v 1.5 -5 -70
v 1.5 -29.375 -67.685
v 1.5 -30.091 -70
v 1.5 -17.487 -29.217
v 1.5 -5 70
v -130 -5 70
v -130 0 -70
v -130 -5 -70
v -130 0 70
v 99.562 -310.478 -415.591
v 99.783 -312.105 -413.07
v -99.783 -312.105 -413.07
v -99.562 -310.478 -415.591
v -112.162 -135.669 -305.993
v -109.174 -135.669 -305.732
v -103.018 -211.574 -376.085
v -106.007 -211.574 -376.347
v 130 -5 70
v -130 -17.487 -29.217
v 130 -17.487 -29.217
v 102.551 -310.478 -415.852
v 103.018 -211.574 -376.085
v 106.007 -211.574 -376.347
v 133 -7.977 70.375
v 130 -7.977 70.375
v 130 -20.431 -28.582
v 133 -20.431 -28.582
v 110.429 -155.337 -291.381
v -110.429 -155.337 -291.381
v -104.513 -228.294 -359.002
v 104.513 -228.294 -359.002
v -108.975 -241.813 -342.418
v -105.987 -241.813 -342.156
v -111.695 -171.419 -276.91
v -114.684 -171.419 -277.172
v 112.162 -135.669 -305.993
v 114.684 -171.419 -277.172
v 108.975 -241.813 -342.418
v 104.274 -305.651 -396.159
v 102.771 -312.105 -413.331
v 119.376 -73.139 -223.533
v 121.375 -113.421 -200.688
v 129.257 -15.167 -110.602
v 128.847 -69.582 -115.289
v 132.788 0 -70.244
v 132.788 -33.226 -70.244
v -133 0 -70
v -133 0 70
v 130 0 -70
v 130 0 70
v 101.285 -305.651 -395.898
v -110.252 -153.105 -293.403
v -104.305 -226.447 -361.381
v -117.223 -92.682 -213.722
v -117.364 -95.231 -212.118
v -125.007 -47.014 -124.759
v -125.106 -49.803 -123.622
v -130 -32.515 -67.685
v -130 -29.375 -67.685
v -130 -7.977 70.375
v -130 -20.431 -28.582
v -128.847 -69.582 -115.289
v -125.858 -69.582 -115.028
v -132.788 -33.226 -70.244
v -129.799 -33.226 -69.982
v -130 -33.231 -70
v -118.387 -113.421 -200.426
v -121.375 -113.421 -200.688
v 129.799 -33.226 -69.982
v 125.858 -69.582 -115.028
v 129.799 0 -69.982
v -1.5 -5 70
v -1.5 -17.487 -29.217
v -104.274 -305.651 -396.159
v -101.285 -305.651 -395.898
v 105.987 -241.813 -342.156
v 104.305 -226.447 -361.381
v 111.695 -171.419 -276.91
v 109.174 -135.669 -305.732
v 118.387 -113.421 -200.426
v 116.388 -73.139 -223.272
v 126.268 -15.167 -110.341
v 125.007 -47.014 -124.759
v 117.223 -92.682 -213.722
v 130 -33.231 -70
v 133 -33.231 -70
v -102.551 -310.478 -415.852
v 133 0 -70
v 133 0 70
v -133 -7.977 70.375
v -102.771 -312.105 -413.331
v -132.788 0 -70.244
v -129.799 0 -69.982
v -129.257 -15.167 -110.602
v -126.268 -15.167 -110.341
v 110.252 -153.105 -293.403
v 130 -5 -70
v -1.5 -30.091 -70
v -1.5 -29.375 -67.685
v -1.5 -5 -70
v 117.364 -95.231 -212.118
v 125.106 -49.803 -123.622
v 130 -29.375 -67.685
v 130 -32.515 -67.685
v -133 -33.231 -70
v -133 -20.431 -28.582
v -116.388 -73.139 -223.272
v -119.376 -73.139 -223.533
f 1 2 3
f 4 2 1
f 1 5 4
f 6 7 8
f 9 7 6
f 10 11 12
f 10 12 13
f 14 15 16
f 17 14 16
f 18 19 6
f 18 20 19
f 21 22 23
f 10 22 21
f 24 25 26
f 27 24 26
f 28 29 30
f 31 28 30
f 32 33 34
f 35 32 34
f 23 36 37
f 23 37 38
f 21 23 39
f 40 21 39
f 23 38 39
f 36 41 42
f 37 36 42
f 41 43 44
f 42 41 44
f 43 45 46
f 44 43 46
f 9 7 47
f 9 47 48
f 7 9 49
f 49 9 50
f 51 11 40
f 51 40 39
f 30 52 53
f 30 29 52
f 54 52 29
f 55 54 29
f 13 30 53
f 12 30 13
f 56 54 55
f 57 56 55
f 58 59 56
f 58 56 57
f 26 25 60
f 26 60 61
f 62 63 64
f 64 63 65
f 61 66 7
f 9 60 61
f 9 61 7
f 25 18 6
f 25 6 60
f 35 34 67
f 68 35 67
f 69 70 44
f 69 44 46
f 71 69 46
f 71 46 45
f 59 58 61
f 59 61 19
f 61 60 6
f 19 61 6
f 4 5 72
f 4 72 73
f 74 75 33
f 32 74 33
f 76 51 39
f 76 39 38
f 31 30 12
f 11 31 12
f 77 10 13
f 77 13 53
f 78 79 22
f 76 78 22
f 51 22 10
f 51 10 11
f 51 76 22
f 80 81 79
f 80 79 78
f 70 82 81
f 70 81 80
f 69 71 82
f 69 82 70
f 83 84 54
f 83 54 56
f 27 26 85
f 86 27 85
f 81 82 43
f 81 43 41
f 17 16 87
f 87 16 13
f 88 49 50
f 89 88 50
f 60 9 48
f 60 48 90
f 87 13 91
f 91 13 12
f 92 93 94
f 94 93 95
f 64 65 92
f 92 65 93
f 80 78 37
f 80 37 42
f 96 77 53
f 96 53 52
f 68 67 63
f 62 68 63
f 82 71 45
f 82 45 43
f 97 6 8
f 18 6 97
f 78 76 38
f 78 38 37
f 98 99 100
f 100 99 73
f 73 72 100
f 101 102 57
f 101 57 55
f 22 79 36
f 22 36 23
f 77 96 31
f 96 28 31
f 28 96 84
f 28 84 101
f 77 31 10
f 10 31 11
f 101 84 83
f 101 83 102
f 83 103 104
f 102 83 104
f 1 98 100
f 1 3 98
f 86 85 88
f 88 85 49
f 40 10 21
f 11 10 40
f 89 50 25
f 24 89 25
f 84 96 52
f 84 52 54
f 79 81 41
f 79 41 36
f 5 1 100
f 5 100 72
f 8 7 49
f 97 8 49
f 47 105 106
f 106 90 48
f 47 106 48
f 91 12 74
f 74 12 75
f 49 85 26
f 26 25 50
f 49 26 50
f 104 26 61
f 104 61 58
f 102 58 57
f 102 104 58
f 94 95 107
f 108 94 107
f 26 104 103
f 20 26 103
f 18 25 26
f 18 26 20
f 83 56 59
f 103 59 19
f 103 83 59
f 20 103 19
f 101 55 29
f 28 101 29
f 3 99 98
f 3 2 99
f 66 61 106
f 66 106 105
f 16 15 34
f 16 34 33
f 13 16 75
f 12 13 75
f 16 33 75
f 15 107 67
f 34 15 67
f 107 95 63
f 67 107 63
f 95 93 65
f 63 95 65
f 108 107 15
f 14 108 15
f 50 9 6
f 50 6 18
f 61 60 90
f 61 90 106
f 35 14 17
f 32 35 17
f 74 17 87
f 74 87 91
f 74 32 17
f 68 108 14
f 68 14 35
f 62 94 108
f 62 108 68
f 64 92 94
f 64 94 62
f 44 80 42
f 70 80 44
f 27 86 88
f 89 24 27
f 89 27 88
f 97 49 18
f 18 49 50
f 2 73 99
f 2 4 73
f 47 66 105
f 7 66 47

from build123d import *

# Parameters (mm, degrees)
F0_W      = 260
F0_H      = 140
F1_DEPTH  = 5
F3_DEPTH  = 130
F7_W      = 657.2483032942
F7_H      = 632.9057961702
F8_DEPTH  = 174
F12_DEPTH = 3
F14_DEPTH = 3
F16_DEPTH = 1.5


with BuildPart() as f1:
    # F0 (on Front) → F1 (new body)
    with BuildSketch(Plane.XZ):
        Rectangle(F0_W, F0_H)
    extrude(amount=F1_DEPTH)


with BuildPart() as f3:
    # F2 (on Right) → F3 (new body, symmetric)
    with BuildSketch(Plane.YZ):
        Polygon((-17.4873212862, -29.2172707098), (-5, 70), (-7.9765181213, 70.3746196386), (-20.4310644359, -28.5822394788), (-49.8025794157, -123.622248239), (-95.2313994122, -212.1180756609), (-155.3371927178, -291.3808208093), (-228.2936752181, -359.0021252816), (-312.1046553088, -413.0696322199), (-310.4783616328, -415.5905782486), (-226.4468273432, -361.3807890501), (-153.1053519834, -293.4026455624), (-92.6823791695, -213.7216292766), (-47.013830355, -124.7588075522), align=None)
    extrude(amount=F3_DEPTH, both=True)


with BuildPart() as f8:
    # F7 (on face) → F8 (new body)
    with BuildSketch(Plane(origin=(134.8891541046, 0, -11.8012718167), x_dir=(0, -1, 0), z_dir=(-0.9961946981, 0, 0.0871557427))):
        with Locations((150.0718072057, -147.6648971438)):
            Rectangle(F7_W, F7_H)
    extrude(amount=-F8_DEPTH)


with BuildPart() as f9_1:
    # F9: instance of F8
    add(f8.part.mirror(Plane.YZ))


with BuildPart() as f3_1:
    add(f3.part)

    # F10: cut F9_1, F8
    add(f9_1.part, mode=Mode.SUBTRACT)
    add(f8.part, mode=Mode.SUBTRACT)


with BuildPart() as f12:
    # F11 (on face) → F12 (new body)
    with BuildSketch(Plane(origin=(134.8891541046, 0, -11.8012718167), x_dir=(0, -1, 0), z_dir=(-0.9961946981, 0, 0.0871557427))):
        Polygon((305.6514709987, -385.5638570208), (241.8128323534, -331.6166724948), (171.4191538735, -266.1215299442), (113.4206222217, -189.3455181509), (69.5816849654, -103.6205900856), (33.2255263913, -58.4033823092), (0, -58.4033823092), (15.1668360589, -98.9159475502), (73.139217219, -212.2781437109), (135.6694516868, -295.0530326988), (211.573731067, -365.6753059705), (310.4783616328, -405.3317159841), (312.1046553088, -402.8011403512), align=None)
    extrude(amount=-F12_DEPTH)


with BuildPart() as f14:
    # F13 (on face) → F14 (new body)
    with BuildSketch(Plane.YZ.offset(130)):
        Polygon((0, 70), (-7.9765181213, 70.3746196386), (-20.4310644359, -28.5822394788), (-33.230961968, -70), (0, -70), align=None)
    extrude(amount=F14_DEPTH)


with BuildPart() as f16:
    # F15 (on Right) → F16 (new body, symmetric)
    with BuildSketch(Plane.YZ):
        Polygon((-30.0909664235, -70), (-5, -70), (-5, 70), (-17.4873212862, -29.2172707098), (-29.3753939774, -67.684558948), align=None)
    extrude(amount=F16_DEPTH, both=True)


with BuildPart() as f17_1:
    # F17: instance of F14
    add(f14.part.mirror(Plane.YZ))


with BuildPart() as f17_2:
    # F17: instance of F12
    add(f12.part.mirror(Plane.YZ))


solid = Compound([f1.part, f3_1.part, f12.part, f14.part, f16.part, f17_1.part, f17_2.part])
